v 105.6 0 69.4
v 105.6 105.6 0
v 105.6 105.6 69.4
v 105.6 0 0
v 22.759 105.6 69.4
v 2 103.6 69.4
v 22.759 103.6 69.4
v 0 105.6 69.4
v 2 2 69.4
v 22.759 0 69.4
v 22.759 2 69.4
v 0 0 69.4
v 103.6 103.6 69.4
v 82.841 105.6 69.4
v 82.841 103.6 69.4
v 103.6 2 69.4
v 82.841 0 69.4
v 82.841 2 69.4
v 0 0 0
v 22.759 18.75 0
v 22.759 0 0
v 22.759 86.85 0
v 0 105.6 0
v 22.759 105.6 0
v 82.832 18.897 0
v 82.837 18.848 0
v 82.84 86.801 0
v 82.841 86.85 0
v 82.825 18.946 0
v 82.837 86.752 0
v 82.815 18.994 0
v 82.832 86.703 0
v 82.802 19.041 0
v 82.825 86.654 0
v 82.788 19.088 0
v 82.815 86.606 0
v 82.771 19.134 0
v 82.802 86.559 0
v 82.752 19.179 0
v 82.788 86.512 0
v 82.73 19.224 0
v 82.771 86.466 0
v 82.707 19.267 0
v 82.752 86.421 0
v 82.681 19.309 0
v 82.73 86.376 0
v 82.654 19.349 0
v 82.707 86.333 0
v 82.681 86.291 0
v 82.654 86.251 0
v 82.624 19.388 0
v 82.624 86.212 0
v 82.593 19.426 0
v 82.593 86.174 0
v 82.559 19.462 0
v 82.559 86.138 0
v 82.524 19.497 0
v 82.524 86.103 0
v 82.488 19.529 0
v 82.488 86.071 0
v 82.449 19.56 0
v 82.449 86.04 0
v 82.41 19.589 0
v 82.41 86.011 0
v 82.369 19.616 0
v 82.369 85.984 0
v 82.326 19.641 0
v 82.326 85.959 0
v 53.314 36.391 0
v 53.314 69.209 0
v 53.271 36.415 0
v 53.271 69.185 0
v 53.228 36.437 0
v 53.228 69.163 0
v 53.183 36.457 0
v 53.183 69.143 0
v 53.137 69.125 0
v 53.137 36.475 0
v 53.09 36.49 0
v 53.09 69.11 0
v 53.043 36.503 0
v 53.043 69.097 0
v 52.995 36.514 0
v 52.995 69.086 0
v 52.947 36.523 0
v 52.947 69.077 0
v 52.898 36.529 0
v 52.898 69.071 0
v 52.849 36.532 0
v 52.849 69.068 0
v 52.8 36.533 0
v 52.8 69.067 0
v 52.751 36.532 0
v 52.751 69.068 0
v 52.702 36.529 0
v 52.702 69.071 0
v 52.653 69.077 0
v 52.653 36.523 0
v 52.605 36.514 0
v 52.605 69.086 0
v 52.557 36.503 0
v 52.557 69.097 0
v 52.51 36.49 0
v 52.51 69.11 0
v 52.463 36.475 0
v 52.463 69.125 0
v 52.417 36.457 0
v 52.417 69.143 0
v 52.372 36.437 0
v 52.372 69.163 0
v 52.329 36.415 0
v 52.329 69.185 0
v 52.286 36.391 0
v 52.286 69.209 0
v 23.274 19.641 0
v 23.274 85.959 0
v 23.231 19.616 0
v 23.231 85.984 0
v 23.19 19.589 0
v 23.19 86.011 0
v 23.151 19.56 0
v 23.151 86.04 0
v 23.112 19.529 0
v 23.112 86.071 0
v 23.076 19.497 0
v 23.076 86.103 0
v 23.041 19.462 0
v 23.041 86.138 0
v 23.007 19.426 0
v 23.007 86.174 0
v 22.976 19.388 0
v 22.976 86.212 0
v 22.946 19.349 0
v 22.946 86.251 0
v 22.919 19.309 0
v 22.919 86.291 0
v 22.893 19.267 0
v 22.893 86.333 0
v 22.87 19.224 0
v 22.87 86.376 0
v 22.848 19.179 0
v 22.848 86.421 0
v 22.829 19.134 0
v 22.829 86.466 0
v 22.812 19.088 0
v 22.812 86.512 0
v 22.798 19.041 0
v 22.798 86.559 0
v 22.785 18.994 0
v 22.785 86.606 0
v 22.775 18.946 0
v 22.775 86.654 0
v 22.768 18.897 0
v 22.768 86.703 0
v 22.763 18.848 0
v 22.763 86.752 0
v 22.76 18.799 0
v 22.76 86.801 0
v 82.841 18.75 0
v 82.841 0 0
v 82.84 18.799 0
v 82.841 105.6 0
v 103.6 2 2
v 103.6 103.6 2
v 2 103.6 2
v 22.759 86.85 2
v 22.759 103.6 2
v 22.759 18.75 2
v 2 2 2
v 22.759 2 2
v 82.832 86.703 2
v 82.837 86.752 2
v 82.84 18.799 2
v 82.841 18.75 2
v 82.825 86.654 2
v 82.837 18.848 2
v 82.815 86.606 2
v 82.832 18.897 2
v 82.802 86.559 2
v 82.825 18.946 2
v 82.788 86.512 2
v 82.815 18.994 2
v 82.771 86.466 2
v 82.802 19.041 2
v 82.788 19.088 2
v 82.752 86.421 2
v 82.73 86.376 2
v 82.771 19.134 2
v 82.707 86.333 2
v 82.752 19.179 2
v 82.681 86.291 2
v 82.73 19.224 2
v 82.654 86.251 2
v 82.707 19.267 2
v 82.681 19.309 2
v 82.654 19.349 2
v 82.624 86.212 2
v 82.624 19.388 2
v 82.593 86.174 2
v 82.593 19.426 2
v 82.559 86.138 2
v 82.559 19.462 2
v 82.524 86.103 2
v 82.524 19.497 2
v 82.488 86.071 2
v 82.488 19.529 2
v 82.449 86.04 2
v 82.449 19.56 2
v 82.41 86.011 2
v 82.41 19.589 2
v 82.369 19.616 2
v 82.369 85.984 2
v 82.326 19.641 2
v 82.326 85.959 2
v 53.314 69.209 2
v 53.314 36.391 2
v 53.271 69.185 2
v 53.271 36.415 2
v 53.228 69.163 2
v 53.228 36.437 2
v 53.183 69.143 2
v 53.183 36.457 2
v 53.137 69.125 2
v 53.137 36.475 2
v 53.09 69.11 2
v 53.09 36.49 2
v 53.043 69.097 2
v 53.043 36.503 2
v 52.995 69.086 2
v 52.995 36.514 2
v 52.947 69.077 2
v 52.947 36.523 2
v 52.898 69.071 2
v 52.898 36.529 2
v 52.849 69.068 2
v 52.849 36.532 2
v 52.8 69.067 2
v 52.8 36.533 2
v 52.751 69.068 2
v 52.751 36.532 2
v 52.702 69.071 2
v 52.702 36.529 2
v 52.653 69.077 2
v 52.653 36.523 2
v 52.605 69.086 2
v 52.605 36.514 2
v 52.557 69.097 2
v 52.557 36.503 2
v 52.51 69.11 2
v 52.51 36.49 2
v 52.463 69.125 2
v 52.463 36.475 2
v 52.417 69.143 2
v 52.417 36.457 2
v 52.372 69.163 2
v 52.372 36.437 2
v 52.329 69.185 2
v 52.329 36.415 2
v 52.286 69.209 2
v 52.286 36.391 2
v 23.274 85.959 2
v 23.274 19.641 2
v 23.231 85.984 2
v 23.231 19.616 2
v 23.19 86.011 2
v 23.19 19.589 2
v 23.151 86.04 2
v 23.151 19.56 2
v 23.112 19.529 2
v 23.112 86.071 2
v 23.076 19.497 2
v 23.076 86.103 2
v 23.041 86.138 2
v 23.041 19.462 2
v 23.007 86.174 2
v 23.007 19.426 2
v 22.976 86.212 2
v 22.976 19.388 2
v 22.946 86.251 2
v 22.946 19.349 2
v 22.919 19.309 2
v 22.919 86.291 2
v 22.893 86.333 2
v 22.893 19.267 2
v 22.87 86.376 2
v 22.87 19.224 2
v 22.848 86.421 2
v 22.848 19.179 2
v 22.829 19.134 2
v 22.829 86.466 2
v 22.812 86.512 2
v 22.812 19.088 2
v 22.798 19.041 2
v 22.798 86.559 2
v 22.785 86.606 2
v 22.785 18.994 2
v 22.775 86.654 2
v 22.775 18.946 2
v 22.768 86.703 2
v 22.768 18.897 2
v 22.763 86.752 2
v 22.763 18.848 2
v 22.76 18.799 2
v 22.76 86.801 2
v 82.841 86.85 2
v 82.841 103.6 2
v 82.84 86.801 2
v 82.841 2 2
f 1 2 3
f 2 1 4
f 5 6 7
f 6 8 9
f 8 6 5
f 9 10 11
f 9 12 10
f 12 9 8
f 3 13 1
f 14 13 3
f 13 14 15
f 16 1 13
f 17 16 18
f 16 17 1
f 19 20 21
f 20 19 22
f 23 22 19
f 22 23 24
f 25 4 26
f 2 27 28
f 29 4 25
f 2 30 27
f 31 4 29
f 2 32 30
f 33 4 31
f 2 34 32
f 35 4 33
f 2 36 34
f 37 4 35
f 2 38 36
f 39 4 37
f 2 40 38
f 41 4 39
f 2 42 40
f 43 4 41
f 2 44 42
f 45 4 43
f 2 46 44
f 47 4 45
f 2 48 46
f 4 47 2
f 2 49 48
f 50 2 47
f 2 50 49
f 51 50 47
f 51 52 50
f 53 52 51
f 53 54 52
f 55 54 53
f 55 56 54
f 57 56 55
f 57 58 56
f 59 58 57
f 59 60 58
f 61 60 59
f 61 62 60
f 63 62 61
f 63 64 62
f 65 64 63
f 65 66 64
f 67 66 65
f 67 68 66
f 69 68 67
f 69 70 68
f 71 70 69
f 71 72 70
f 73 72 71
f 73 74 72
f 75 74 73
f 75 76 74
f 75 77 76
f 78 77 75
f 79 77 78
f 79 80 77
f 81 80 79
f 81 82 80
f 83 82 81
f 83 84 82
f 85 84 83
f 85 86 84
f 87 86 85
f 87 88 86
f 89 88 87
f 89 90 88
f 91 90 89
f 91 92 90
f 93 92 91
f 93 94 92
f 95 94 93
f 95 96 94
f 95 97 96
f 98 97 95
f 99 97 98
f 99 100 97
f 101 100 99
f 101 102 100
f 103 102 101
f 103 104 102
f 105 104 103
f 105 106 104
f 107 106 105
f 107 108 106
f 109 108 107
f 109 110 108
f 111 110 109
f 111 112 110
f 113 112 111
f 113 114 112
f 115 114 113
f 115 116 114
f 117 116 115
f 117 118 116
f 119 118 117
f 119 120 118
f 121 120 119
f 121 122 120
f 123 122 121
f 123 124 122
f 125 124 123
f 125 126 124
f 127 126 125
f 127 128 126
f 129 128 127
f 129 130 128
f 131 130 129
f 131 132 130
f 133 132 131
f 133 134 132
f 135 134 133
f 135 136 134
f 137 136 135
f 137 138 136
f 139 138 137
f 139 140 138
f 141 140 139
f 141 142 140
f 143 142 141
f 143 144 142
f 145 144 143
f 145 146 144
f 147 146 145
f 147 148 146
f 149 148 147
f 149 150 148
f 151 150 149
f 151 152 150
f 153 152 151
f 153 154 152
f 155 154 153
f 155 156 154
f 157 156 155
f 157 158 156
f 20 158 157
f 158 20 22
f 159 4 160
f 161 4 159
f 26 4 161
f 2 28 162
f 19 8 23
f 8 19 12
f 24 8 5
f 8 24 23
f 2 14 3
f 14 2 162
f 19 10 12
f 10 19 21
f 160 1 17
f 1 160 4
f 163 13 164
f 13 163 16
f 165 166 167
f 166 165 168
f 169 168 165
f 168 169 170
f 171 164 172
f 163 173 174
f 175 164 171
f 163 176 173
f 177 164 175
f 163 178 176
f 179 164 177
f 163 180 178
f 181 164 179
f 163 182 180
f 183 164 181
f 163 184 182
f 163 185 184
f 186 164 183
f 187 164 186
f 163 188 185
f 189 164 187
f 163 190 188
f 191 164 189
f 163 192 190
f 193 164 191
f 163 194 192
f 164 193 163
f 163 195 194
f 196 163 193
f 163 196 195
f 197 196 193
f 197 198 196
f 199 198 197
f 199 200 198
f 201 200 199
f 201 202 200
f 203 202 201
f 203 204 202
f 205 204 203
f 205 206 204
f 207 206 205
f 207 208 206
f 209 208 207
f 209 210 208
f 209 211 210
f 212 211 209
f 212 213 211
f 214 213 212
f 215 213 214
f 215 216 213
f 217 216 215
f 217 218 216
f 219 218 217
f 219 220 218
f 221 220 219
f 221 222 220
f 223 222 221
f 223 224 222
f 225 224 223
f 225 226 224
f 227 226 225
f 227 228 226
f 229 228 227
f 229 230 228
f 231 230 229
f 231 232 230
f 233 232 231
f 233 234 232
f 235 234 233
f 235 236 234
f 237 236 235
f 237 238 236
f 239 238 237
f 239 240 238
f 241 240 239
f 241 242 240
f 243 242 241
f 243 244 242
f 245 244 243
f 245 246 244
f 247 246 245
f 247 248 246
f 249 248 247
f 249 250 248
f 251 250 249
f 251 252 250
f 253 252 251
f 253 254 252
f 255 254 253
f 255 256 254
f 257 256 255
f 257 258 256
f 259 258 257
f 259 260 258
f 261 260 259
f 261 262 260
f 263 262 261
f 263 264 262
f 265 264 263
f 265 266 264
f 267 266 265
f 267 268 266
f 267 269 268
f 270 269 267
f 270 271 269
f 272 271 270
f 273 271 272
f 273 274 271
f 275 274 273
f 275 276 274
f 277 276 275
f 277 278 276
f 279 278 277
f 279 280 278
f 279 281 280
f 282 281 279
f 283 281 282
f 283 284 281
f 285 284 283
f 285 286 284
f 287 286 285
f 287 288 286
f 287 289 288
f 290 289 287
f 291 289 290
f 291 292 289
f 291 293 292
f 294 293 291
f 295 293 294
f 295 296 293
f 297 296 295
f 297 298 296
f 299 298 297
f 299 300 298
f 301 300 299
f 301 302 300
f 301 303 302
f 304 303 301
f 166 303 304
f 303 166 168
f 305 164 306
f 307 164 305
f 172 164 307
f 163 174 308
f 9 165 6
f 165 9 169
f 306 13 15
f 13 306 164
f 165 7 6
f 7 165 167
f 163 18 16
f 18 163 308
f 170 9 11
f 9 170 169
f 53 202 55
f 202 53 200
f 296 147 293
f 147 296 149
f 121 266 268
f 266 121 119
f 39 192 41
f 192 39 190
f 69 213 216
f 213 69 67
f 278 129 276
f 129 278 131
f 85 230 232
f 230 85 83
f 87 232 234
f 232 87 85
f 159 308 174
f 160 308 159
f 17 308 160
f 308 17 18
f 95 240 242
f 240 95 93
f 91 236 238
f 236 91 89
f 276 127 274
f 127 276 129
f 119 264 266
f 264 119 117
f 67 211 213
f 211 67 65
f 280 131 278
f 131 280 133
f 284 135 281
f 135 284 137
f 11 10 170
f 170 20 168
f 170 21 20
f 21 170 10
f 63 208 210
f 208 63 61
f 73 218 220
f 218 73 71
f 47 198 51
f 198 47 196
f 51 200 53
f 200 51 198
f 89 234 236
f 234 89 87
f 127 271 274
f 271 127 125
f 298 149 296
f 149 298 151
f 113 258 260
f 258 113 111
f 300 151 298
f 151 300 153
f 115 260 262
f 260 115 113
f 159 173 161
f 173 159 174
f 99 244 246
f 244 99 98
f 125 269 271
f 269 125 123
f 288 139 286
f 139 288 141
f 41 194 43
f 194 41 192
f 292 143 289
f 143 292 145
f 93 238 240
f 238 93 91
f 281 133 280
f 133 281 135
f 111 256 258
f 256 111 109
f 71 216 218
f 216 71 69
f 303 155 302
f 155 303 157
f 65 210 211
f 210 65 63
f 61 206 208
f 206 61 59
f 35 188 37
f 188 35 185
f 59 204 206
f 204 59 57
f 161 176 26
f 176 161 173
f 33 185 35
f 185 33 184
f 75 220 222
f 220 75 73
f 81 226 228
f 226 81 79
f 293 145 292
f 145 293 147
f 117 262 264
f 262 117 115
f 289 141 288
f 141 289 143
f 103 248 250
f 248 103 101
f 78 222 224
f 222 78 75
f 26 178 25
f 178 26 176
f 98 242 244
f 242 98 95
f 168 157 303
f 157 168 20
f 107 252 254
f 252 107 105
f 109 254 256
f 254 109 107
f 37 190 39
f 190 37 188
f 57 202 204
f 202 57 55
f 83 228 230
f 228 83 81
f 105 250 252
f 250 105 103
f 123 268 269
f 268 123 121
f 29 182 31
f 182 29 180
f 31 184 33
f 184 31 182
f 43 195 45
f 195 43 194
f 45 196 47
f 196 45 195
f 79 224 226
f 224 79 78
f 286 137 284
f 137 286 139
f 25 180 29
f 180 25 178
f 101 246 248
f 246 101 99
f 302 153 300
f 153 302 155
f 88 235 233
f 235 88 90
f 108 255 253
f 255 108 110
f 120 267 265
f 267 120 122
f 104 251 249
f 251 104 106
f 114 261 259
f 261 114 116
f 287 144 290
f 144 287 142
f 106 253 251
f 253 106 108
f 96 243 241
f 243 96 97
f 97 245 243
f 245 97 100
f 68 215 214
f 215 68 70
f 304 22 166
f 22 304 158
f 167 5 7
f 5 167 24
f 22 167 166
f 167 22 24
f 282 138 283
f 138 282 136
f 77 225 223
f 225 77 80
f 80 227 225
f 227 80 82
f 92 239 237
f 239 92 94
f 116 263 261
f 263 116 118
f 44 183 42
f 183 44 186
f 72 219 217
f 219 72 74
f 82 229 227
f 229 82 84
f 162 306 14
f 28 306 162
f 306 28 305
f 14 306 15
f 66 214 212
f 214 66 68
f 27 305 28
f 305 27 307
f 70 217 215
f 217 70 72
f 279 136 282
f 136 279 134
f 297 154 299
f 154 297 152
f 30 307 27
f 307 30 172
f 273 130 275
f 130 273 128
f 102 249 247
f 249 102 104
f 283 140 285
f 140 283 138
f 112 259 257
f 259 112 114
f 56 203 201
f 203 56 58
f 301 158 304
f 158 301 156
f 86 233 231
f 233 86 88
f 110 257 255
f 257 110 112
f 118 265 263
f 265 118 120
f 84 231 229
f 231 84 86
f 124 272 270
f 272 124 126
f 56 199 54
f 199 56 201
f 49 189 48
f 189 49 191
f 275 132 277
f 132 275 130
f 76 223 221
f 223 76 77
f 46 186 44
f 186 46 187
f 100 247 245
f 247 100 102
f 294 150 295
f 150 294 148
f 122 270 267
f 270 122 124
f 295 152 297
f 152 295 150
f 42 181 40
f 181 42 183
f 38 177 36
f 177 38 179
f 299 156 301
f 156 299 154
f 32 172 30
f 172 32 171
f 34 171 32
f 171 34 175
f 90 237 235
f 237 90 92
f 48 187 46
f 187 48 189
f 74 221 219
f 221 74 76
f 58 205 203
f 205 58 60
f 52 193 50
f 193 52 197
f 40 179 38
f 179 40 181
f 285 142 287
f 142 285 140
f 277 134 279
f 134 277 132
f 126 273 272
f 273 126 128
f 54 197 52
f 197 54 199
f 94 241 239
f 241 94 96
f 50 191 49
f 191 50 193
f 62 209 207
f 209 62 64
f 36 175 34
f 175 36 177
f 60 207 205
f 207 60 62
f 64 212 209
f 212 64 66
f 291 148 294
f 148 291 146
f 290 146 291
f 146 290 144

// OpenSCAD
// file: ../../internal/tray.scad
// Copyright 2023 Joshua Star, All Rights Reserved

include <base.scad>
include <prim.scad>

module tray_basic(inner_size, r=0, thickness=DEFAULT_THICKNESS, bottom_thickness=undef) {

	half_z = inner_size.z / 2;
	radius = min(r, half_z);

	bottom_thk = bottom_thickness != undef ? bottom_thickness : thickness;

	thk2 = thickness * 2;

	outer_size = inner_size + [thk2, thk2, bottom_thk];
	echo("tray outer dimensions are: ", outer_size);

	inner_radius = radius - thickness;

	union() {
		difference() {
			// outer shell
			if (0 < r) {
				union() {
					translate([0, 0, bottom_thk])
						cylinder_cube([outer_size.x, outer_size.y, outer_size.z - bottom_thk], r=radius);
					cylinder_cube([outer_size.x, outer_size.y, bottom_thk], inner_radius, radius);
				}
			}
			else {
				cube(outer_size);
			}
			
			// lip cutout
			if (0 < radius) {
				translate([0, 0, inner_size.z + SMALL_NUM])
					cylinder_cube([outer_size.x, outer_size.y, bottom_thk], r1=inner_radius, r2=radius);
			}

			// inner cutout
			if (0 < radius) {
				translate([thickness, thickness, bottom_thk])
					rounded_cube(inner_size + [0, 0, bottom_thk], r=inner_radius, flat_top=true);
			}
			else {
				translate([thickness, thickness, bottom_thk])
						cube(inner_size + [0, 0, bottom_thk]);
			}
		}
	}
}

module tray_divided(size, r=0, div_x=1, div_y=1, thickness=DEFAULT_THICKNESS, bottom_thickness=undef, div_height=undef, div_thickness=undef) {

	bottom_thk = bottom_thickness != undef ? bottom_thickness : thickness;

	div_thk = div_thickness != undef ? div_thickness : thickness;
	div_z = div_height != undef ? div_height : size.z;

	max_div_z = 0 == r ? size.z : size.z - bottom_thk;
	clamped_div_z = min(div_z, max_div_z);

	x_minus_div = size.x - (div_thk * (div_x - 1));
	y_minus_div = size.y - (div_thk * (div_y - 1));

	x_off = (x_minus_div / div_x) + div_thk;
	y_off = (y_minus_div / div_y) + div_thk;
	
	union() {
		tray_basic(size, r=r, thickness=thickness, bottom_thickness=bottom_thk);

		// columns, along x
		for (i=[1:1:div_x-1]) {
			translate([i * x_off, thickness, bottom_thk])
				cube([div_thk, size.y, clamped_div_z]);
		}

		// rows, along y
		for (i=[1:1:div_y-1]) {
			translate([thickness, i * y_off, bottom_thk])
				cube([size.x, div_thk, clamped_div_z]);
		}
	}
}

module notch_cutter(h, r) {
	n = 6;
	rotate([0, 0, 180 / n]) cylinder_ngon(2 * r, h, n);
}

module tray_notched(size, div_x=1, div_y=1, thickness=DEFAULT_THICKNESS, bottom_thickness=undef, div_height=undef, div_thickness=undef, notch_lo_x=true, notch_hi_x=true) {

	bottom_thk = bottom_thickness != undef ? bottom_thickness : thickness;

	div_thk = div_thickness != undef ? div_thickness : thickness;
	div_z = div_height != undef ? div_height : size.z;

	x_minus_div = size.x - (div_thk * (div_x - 1));

	x_off = (x_minus_div / div_x) + div_thk;
	
	div_bias = (div_thk - x_off) / 2;

	notch_h = size.z + bottom_thk + 2 * SMALL_NUM;
	notch_r = x_off / 3;

	difference() {
		tray_divided(size, div_x=div_x, div_y=div_y, thickness=thickness, bottom_thickness=bottom_thk, div_height=div_z, div_thickness=div_thk);

		// notch along x
		for (i=[1:1:div_x]) {

			if (notch_lo_x) {
				translate([i * x_off + div_bias, thickness, -SMALL_NUM])
					notch_cutter(notch_h, notch_r);
			}

			if (notch_hi_x) {
				translate([i * x_off + div_bias, size.y + thickness, -SMALL_NUM])
					notch_cutter(notch_h, notch_r);
			}
		}
	}
}

// --- TESTING ---

//tray_basic([240, 120, 30], r=4);

//translate([-1.2, -1.2, 0]) tray_divided([200, 100, 5], div_x=20, div_y=10);
//tray_divided([180, 120, 30], r=15, div_x=3, div_y=2, div_height=25);

//translate([-1.2, -1.2, 0]) tray_notched([200, 100, 30], div_x=20, div_y=10);
// file: ../../internal/prim.scad
// Copyright 2023 Joshua Star, All Rights Reserved

module cylinder_cube(size, r1=1, r2=1, r=undef) {
	r1 = r != undef ? r : r1;
	r2 = r != undef ? r : r2;

	r_max = max(r1, r2);
	hull() {
		translate([r_max, r_max, 0])
			cylinder(size.z, r1, r2);
		translate([size.x - r_max, r_max, 0])
			cylinder(size.z, r1, r2);
		translate([r_max, size.y - r_max, 0])
			cylinder(size.z, r1, r2);
		translate([size.x - r_max, size.y - r_max, 0])
			cylinder(size.z, r1, r2);
	}
}

module cylinder_ngon(width, h, n=6, r=1) {
	hull() {
		for (i=[0:1:n-1]) {
			angl_off = 360 / n;
			posx_off = width / 2 - r;
			rotate([0, 0, i * angl_off]) translate([posx_off, 0, 0])
				cylinder(r=r, h=h);
		}
	}
}

module cylinder_trap(size, ratio, radius=1) {
	hull() {
		half_size_x = size.x / 2;
		translate([radius - half_size_x, radius, 0])
			cylinder(r=radius, h=size.z);
		translate([half_size_x - radius, radius, 0])
			cylinder(r=radius, h=size.z);
		translate([radius - ratio * half_size_x, size.y - radius, 0])
			cylinder(r=radius, h=size.z);
		translate([ratio * half_size_x - radius, size.y - radius, 0])
			cylinder(r=radius, h=size.z);
	}
}

module rounded_cube(size, r=1, flat_top=false) {
	
	half_z = size.z / 2;
	radius = min(r, half_z);
	
	hull() {
		// bottom 'points'
		translate([radius,radius,radius]) sphere(r=radius);
		translate([size.x-radius,radius,radius]) sphere(r=radius);
		translate([radius,size.y-radius,radius]) sphere(r=radius);
		translate([size.x-radius,size.y-radius,radius]) sphere(r=radius);

		// top 'points'
		pos_z = size.z - radius;
		if (flat_top) {
			translate([radius, radius, pos_z]) cylinder(r=radius, h=radius);
			translate([size.x-radius, radius, pos_z]) cylinder(r=radius, h=radius);
			translate([radius, size.y-radius, pos_z]) cylinder(r=radius, h=radius);
			translate([size.x-radius, size.y-radius, pos_z]) cylinder(r=radius, h=radius);
		}
		else {
			translate([radius, radius, pos_z]) sphere(r=radius);
			translate([size.x-radius, radius, pos_z]) sphere(r=radius);
			translate([radius, size.y-radius, pos_z]) sphere(r=radius);
			translate([size.x-radius, size.y-radius, pos_z]) sphere(r=radius);
		}
	}
}

// --- TESTING ---

//cylinder_cube([240, 120, 30], r=8);

//cylinder_cube([240, 120, 16], r1=4, r2=8);
//cylinder_cube([240, 120, 16], r1=8, r2=4);

//cylinder_ngon(10, 5, 7, 1);

//cylinder_trap([100, 50, 30], 0.5, radius=8);

//rounded_cube([240, 120, 30], r=12);
//rounded_cube([240, 120, 30], r=12, flat_top=true);
//rounded_cube([240, 120, 30], r=30, flat_top=true);
// file: ../../internal/math.scad
// Copyright 2023 Joshua Star, All Rights Reserved

function clamp(x, lower, upper) = x < lower ? lower : (upper < x ? upper : x);
function lerp(lower, upper, s) = (upper - lower) * s + lower;
// file: ../../internal/card.scad
// Copyright 2023 Joshua Star, All Rights Reserved

TOLERANCE_MIN = [0.4, 0.4];
TOLERANCE_MAX = [0.8, 0.8];

function std_card_dim() = [67, 93] + TOLERANCE_MIN; // gray
function amer_card_dim() = [59, 91] + TOLERANCE_MIN; // green
function euro_card_dim() = [62, 94] + TOLERANCE_MIN; // purple

function mini_amer_card_dim() = [44, 67] + TOLERANCE_MIN; // yellow
function mini_euro_card_dim() = [46, 71] + TOLERANCE_MIN; // ruby

function 7won_card_dim() = [67, 103] + TOLERANCE_MAX; // brown
function tarot_card_dim() = [73, 122] + TOLERANCE_MAX; // orange

function per_card_thickness() = 0.68;

function calc_card_stack(n, padding=1.2) = n * per_card_thickness() + padding;
// file: ../../internal/base.scad
// Copyright 2023 Joshua Star, All Rights Reserved

fn = $preview ? 16 : 128;
$fn = fn;

SMALL_NUM = $preview ? 0.02 : 0.001;

DEFAULT_PADDING = 1.6;
DEFAULT_THICKNESS = 1.2;
// file: ../../boardgame_tk.scad
// Copyright 2023 Joshua Star, All Rights Reserved

include <internal/base.scad>
include <internal/card.scad>
include <internal/math.scad>
include <internal/prim.scad>
include <internal/tray.scad>

function default_padding() = DEFAULT_PADDING;
function default_thickness() = DEFAULT_THICKNESS;

function gamebox_common() = [286, 286, 68]; // Terraforming Mars, Wingspan

function make_list(v, n) = [for(i=[0:n-1]) v];
function sum_list(v) = [for(p=v) 1] * v;

module card_display(card_size, height, num_stacks, padding=DEFAULT_PADDING, thickness=DEFAULT_THICKNESS, bottom_thickness=undef, div_thickness=undef) {

	div_thk = div_thickness != undef ? div_thickness : thickness;

	dim_x = (card_size.x + padding) * num_stacks + (div_thk * (num_stacks - 1));
	dim_y = card_size.y + padding;
	dim_z = height;

	tray_notched([dim_x, dim_y, dim_z], div_x=num_stacks, thickness=thickness, bottom_thickness=bottom_thickness, div_thickness=div_thickness, notch_hi_x=false);
}

module vertical_cutter(size, r=0.5) {
	difference() {
		translate([0, size.z, 0]) rotate([90, 0, 0])
		linear_extrude(height=size.z) {
			translate([0, r, 0])
			offset(r=-r) {
				offset(r=2*r) {
					union() {
						translate([-(size.x + 2 * r) / 2, 0, 0]) square([size.x + 2 * r, 1]);
						translate([-(size.x - 2 * r)/2, -size.y, 0]) square([size.x - 2 * r, size.y]);
					}
				}
			}
		}

		translate([-(size.x + r), -size.z, 0])
			cube([2 * (size.x + r), 3 * size.z, 2 * (size.y + r)]);
	}
}

module card_tray(card_size, stacks, num_columns=1, padding=[0.8, 0.8, 0.8], thickness=DEFAULT_THICKNESS, bottom_thickness=undef, div_height=undef, div_thickness=undef) {

	bottom_thk = bottom_thickness != undef ? bottom_thickness : thickness;

	div_thk = div_thickness != undef ? div_thickness : thickness;

	col_dim_x = card_size.y + padding.x;

	dim_x = col_dim_x * num_columns + div_thk * (num_columns - 1);
	dim_y = sum_list(stacks) + (div_thk + padding.y) * (len(stacks) - 1);
	dim_z = card_size.x + padding.z;

	div_z = div_height != undef ? div_height : dim_z;

	min_card_dim = min(card_size.x, card_size.y);
	cutter_radius = min_card_dim / 6;

	difference() {
		union() {
			tray_divided([dim_x, dim_y, dim_z], div_x=num_columns, thickness=thickness, bottom_thickness=bottom_thickness);

			div_offsets = [
				for (a=0, b=stacks[0]; a < (len(stacks) - 1); a = a + 1, b = b + (stacks[a]==undef?0:stacks[a]) + padding.y + div_thk)
					b
				];

			// columns, along x
			for (c=[0:1:num_columns-1]) {
				// rows, along y
				for (y=div_offsets) {
					x_off = c * (col_dim_x + div_thk) + thickness;

					translate([x_off, y, bottom_thk])
						cube([col_dim_x, div_thk, div_z]);
				}
			}
		}

		cutout_size = [col_dim_x / 2, dim_z / 2, thickness + 2 * SMALL_NUM];
		cutout_z = bottom_thk + dim_z + SMALL_NUM;

		// cutout
		for (c=[0:1:num_columns-1]) {
			n = 8;

			x_off = c * (col_dim_x + div_thk) + (col_dim_x / 2) + thickness;

			// front cut
			translate([x_off, -SMALL_NUM, cutout_z])
					vertical_cutter(cutout_size, r=cutter_radius);
			
			// back cut
			translate([x_off, dim_y + thickness - SMALL_NUM, cutout_z])
					vertical_cutter(cutout_size, r=cutter_radius);
			
			// middle cut
			translate([x_off, thickness, bottom_thk + div_z + SMALL_NUM])
					vertical_cutter([cutout_size.x, div_z / 2, dim_y], r=cutter_radius);
		}
	}
}

module spacer(size, r=16, div_x=2, div_y=2, spacing=16) {
	difference() {
		cylinder_cube(size, r=r);

		half_spacing = spacing / 2;
		inner_radius = r - half_spacing;

		offset_x = size.x / div_x;
		offset_y = size.y / div_y;
		for (i=[0:1:div_x]) {
			for (j=[0:1:div_y]) {
				translate([i * offset_x + half_spacing, j * offset_y + half_spacing, -1])
				cylinder_cube([
					size.x / div_x - spacing,
					size.y / div_y - spacing,
					size.z + 2], r=inner_radius);
			}
		}
	}
}

module pegs_grid(rows=1, cols=1, radius=1, height=1, spacing=1, alt_pack=false) {
	x_start = spacing + radius;
	y_start = spacing + radius;

	x_alt_start = radius + spacing / 2;

	x_offset = 2 * radius + spacing;
	y_offset = alt_pack ? ((radius + spacing / 2) * sqrt(3)) : 2 * radius + spacing;

	for (r=[0:1:rows-1]) {
		is_alt = alt_pack ? (r % 2) : 0;
		for (c=[0:1:cols-(1 + is_alt)]) {
			translate([
					c * x_offset + x_start + x_alt_start * is_alt,
					r * y_offset + y_start,
					0])
				cylinder(h=height, r=radius);
		}
	}
}

module peg_board(rows=1, cols=1, radius=1, height=1, spacing=1) {
	difference() {
		cylinder_cube([
			cols * 2 * radius + (cols + 1) * spacing,
			rows * 2 * radius + (rows + 1) * spacing,
			height], r=radius);

		translate([0, 0, -height/2])
			pegs_grid(rows=rows, cols=cols, radius=radius, height=2*height, spacing=spacing, alt_pack=false);
	}
}

// --- TESTING ---

//%cube(gamebox_common());

//card_display(mini_euro_card_dim(), 30, 3);

//vertical_cutter([100,50, 10], r=10);

//card_tray(std_card_dim(), [30, 30, 8, 8, 8, 16, 42], num_columns=4, div_height=55);

//spacer([240, 120, 10], r=16, div_x=4, div_y=3, spacing=8);

//pegs_grid(rows=4, cols=5, radius=32, height=4, spacing=6, alt_pack=false);
//pegs_grid(rows=4, cols=5, radius=32, height=4, spacing=6, alt_pack=true);

//peg_board(rows=3, cols=4, radius=28, height=4, spacing=6);
// main file
// Copyright 2023 Joshua Star, All Rights Reserved

use <../../boardgame_tk.scad>

thk = 2;

dim_xy = 100 + default_padding();
dim_z = 69.4 - thk;

tray_notched([dim_xy, dim_xy, dim_z], thickness=thk);
